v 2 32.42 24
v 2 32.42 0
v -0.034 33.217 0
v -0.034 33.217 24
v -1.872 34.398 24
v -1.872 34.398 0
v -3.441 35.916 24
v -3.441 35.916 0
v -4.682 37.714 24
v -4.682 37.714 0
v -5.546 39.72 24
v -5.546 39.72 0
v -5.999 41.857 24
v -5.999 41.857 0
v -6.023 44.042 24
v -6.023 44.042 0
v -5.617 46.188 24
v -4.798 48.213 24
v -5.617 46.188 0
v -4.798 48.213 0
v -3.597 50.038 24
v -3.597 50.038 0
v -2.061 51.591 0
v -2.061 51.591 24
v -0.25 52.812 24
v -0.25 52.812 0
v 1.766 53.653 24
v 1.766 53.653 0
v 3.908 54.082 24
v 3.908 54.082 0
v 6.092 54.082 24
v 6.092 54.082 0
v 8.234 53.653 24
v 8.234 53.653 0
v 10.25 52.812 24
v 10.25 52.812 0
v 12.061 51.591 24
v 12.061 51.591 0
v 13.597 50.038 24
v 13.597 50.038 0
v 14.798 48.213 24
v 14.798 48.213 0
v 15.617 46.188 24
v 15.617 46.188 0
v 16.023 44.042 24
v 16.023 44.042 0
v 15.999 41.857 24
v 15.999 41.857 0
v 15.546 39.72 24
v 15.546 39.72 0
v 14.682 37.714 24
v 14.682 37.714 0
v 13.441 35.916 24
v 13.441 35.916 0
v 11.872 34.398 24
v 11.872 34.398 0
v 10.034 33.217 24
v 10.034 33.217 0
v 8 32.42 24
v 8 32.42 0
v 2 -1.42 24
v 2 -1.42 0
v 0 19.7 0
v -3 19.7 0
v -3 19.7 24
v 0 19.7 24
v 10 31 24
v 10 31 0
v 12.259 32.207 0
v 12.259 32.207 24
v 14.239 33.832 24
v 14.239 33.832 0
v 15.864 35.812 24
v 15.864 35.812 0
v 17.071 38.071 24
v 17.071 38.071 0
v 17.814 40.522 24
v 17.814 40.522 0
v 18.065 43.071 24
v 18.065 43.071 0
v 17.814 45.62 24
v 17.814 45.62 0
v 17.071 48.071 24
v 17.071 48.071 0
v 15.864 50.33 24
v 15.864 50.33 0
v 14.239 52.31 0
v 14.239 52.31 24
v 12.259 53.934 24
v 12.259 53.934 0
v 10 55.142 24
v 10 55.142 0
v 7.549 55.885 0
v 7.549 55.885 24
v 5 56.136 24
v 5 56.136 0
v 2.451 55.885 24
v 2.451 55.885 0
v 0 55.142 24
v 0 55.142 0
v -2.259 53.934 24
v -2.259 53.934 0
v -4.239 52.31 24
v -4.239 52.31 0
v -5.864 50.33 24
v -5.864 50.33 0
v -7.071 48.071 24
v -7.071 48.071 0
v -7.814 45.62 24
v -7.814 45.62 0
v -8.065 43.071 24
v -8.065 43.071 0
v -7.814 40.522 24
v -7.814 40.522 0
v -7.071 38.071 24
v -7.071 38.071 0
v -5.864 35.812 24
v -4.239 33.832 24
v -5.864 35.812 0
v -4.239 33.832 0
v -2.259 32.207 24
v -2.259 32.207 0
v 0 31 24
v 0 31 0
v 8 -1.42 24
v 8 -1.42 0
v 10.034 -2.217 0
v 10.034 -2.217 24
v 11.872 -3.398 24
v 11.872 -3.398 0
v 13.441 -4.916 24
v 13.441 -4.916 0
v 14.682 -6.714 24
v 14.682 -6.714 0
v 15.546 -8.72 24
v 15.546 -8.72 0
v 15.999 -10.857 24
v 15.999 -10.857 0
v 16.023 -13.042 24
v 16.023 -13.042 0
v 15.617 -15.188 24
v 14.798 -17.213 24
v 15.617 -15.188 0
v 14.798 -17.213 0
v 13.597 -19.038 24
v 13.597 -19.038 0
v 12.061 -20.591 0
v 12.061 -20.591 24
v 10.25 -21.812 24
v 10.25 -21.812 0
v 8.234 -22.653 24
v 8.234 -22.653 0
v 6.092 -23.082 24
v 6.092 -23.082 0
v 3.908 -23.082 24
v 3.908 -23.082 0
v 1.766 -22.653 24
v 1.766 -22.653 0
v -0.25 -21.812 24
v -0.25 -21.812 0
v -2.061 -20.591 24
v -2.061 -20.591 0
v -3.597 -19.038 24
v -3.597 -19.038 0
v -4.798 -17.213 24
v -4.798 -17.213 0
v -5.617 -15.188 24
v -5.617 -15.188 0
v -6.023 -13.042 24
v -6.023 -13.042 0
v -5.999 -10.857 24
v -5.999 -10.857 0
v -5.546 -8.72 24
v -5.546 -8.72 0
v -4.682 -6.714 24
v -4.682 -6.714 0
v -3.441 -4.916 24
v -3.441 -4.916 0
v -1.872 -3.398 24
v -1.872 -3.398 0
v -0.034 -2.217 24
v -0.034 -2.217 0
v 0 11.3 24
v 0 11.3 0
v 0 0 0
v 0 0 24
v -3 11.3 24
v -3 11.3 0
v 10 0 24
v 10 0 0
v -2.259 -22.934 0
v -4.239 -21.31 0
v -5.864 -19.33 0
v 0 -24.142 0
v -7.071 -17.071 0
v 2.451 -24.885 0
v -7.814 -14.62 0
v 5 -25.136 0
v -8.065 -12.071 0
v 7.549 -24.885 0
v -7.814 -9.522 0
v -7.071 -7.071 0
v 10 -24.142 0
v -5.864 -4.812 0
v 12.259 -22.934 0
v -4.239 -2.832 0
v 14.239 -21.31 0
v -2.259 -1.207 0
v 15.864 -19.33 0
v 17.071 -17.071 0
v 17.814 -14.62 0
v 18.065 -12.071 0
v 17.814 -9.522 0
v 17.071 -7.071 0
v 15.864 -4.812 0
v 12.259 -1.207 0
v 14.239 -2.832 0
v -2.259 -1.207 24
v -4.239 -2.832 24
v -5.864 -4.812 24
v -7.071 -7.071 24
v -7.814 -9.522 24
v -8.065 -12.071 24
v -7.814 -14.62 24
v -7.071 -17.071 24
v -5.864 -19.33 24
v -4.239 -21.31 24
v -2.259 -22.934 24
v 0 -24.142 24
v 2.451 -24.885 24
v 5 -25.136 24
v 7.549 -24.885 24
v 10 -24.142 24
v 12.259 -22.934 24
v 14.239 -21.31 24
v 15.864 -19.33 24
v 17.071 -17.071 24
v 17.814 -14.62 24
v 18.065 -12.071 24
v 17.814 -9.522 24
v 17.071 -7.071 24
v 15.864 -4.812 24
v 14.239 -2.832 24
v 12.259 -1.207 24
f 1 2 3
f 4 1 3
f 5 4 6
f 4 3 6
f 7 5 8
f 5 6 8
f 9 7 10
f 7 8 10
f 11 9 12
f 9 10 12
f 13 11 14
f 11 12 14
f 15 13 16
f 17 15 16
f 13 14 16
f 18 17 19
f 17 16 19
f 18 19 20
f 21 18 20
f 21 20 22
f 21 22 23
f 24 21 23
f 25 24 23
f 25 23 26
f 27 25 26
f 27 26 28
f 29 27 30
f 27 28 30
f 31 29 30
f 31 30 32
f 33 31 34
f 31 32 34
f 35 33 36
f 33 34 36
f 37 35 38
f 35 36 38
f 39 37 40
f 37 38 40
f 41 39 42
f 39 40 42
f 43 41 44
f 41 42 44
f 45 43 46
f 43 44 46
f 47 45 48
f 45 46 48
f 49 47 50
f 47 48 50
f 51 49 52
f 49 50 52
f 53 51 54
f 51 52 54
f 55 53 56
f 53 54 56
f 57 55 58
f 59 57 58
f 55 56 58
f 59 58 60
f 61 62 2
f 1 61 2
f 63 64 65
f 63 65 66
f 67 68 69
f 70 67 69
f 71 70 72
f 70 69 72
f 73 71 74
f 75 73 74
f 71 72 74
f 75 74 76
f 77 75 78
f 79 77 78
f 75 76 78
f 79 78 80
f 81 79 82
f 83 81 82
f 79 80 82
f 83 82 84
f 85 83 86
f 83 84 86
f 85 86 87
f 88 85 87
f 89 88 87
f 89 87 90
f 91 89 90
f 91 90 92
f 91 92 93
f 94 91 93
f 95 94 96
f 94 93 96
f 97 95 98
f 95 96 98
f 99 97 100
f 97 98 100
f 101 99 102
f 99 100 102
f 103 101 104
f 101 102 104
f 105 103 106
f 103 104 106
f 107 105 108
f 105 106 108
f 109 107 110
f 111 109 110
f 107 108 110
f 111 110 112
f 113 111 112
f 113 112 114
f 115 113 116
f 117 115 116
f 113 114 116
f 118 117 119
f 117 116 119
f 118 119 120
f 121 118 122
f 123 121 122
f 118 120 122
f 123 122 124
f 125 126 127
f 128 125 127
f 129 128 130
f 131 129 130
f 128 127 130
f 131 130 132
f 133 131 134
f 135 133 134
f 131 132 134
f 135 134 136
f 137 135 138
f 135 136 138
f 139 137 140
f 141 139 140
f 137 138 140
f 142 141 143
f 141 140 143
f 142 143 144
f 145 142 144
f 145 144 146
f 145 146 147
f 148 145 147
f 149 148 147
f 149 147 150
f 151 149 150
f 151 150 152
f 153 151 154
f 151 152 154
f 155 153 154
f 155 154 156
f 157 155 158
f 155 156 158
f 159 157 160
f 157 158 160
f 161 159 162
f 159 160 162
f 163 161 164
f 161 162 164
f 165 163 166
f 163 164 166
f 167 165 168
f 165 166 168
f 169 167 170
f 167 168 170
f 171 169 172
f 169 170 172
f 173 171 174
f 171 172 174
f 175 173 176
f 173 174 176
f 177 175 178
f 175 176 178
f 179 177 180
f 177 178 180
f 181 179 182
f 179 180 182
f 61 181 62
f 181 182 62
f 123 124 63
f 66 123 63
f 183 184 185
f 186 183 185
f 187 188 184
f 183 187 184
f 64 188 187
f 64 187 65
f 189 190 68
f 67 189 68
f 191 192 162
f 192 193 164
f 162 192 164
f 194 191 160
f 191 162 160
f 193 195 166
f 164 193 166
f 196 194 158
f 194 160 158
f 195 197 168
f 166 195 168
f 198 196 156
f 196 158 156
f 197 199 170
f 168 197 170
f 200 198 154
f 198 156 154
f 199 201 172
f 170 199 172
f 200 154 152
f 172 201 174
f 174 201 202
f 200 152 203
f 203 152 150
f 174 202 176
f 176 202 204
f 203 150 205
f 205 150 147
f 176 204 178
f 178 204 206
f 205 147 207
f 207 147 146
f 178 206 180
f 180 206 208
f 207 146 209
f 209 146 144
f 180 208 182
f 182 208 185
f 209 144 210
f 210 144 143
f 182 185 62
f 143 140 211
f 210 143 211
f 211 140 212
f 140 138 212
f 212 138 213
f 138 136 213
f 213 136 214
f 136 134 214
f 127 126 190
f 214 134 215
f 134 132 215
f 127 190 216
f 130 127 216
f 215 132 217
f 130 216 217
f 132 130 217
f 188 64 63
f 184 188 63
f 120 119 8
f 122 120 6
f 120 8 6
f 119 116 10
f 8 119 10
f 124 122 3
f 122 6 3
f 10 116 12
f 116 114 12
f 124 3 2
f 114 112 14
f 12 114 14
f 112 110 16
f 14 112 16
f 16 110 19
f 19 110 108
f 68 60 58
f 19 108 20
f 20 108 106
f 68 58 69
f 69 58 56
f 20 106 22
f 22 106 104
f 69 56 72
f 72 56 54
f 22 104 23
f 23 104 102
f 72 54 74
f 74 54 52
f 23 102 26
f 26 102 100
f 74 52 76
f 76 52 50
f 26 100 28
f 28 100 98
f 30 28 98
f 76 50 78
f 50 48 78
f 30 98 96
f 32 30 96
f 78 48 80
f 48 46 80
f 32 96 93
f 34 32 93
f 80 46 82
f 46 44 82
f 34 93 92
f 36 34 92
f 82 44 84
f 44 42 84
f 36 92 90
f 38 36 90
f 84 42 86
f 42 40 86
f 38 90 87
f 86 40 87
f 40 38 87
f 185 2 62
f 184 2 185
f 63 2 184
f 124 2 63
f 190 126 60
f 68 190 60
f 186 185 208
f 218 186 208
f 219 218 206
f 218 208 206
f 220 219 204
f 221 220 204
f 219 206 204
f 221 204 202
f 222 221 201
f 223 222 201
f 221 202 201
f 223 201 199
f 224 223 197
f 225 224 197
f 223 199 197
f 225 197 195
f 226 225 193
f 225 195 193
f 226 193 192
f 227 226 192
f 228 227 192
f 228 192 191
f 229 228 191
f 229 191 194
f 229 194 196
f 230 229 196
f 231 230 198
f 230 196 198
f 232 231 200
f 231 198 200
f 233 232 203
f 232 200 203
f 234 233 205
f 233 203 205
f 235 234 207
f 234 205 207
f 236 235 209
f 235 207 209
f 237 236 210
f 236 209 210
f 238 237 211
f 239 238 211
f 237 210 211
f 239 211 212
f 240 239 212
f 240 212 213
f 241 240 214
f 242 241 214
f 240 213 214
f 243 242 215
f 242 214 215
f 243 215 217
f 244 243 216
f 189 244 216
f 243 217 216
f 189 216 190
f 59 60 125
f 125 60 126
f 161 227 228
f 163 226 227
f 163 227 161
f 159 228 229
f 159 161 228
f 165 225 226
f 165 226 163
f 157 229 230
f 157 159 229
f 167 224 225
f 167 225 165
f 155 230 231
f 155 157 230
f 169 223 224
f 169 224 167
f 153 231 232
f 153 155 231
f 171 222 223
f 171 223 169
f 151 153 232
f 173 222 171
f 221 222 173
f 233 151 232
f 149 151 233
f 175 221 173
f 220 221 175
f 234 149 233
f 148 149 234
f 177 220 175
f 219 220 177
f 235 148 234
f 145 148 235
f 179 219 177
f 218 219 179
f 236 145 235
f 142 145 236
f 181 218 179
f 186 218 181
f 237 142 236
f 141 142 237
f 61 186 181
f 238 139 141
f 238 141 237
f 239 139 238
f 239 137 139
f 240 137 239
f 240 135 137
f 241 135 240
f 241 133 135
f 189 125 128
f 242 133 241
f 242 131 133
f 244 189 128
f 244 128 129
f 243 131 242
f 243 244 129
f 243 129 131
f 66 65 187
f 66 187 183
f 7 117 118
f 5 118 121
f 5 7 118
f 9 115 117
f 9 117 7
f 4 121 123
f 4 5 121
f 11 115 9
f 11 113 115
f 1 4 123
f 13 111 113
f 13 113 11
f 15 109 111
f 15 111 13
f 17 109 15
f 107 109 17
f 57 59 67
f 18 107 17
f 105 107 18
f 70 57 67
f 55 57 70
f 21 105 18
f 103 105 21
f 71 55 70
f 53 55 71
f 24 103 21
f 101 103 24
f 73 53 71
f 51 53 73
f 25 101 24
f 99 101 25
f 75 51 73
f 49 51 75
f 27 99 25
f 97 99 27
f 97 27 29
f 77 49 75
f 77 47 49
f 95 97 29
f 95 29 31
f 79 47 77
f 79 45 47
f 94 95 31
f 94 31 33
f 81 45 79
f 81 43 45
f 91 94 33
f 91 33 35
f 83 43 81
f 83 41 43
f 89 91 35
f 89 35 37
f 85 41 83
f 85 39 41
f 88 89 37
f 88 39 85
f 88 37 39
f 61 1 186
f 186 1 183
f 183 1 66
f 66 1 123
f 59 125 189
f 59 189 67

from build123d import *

# Parameters (mm, degrees)
F0_W     = 3
F0_H     = 8.4
F1_DEPTH = 24


with BuildPart() as f1:
    # F0 (on Top) → F1 (new body)
    with BuildSketch(Plane.XY):
        with BuildLine():
            Line((0, 11.3), (0, 0))
            ThreePointArc((0, 0), (5, -25.136427), (10, 0))
            Line((10, 0), (10, 31))
            ThreePointArc((10, 31), (5, 56.136427), (0, 31))
            Line((0, 31), (0, 19.7))
            Line((0, 19.7), (0, 11.3))
        make_face()
        with BuildLine():
            ThreePointArc((2, 32.419858), (5, 54.136427), (8, 32.419858))
            Line((8, 32.419858), (8, -1.419858))
            ThreePointArc((8, -1.419858), (5, -23.136427), (2, -1.419858))
            Line((2, -1.419858), (2, 32.419858))
        make_face(mode=Mode.SUBTRACT)
        with Locations((-1.5, 15.5)):
            Rectangle(F0_W, F0_H)
    extrude(amount=F1_DEPTH)


solid = f1.part
